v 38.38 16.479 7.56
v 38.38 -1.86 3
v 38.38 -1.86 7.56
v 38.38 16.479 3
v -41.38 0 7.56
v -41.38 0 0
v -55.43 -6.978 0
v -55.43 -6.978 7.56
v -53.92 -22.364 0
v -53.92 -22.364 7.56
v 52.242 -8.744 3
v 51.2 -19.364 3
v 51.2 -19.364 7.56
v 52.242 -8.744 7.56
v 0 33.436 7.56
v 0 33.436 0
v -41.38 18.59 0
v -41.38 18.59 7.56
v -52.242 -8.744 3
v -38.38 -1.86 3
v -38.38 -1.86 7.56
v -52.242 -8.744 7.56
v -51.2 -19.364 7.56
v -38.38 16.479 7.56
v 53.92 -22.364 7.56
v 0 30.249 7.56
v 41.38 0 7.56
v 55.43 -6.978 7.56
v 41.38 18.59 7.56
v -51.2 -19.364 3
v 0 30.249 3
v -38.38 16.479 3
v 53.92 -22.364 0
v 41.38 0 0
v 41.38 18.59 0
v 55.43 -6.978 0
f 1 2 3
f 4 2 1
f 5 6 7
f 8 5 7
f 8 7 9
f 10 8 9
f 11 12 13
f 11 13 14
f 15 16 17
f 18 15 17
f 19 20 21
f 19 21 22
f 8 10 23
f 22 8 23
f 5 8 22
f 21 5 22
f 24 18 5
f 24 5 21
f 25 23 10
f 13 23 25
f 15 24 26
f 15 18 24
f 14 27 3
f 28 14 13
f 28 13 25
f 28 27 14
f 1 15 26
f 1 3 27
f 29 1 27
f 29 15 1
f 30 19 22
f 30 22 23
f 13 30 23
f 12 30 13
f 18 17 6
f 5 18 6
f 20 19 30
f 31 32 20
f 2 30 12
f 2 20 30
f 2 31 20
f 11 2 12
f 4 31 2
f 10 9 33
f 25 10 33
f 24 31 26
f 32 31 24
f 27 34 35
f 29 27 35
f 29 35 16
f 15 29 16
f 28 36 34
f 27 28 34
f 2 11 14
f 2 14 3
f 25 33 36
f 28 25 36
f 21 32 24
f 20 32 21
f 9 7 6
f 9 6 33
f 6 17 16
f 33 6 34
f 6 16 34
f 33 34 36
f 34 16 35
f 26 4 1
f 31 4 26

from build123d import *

# Parameters (mm, degrees)
F1_DEPTH = 7.56
F2_T     = -3


with BuildPart() as f1:
    # F0 (on Top) → F1 (new body)
    with BuildSketch(Plane.XY):
        Polygon((41.38, 18.59), (0, 33.4360361274), (-41.38, 18.59), (-41.38, 0), (-55.43, -6.9778825002), (-53.92, -22.3639638726), (0, -22.3639638726), (53.92, -22.3639638726), (55.43, -6.9778825002), (41.38, 0), align=None)
    extrude(amount=F1_DEPTH)

    # F2
    f2_openings = [f1.faces().sort_by_distance(p)[0] for p in [
        (0, 0.369388, 7.56),
    ]]
    offset(amount=F2_T, openings=f2_openings, kind=Kind.INTERSECTION)


solid = f1.part
